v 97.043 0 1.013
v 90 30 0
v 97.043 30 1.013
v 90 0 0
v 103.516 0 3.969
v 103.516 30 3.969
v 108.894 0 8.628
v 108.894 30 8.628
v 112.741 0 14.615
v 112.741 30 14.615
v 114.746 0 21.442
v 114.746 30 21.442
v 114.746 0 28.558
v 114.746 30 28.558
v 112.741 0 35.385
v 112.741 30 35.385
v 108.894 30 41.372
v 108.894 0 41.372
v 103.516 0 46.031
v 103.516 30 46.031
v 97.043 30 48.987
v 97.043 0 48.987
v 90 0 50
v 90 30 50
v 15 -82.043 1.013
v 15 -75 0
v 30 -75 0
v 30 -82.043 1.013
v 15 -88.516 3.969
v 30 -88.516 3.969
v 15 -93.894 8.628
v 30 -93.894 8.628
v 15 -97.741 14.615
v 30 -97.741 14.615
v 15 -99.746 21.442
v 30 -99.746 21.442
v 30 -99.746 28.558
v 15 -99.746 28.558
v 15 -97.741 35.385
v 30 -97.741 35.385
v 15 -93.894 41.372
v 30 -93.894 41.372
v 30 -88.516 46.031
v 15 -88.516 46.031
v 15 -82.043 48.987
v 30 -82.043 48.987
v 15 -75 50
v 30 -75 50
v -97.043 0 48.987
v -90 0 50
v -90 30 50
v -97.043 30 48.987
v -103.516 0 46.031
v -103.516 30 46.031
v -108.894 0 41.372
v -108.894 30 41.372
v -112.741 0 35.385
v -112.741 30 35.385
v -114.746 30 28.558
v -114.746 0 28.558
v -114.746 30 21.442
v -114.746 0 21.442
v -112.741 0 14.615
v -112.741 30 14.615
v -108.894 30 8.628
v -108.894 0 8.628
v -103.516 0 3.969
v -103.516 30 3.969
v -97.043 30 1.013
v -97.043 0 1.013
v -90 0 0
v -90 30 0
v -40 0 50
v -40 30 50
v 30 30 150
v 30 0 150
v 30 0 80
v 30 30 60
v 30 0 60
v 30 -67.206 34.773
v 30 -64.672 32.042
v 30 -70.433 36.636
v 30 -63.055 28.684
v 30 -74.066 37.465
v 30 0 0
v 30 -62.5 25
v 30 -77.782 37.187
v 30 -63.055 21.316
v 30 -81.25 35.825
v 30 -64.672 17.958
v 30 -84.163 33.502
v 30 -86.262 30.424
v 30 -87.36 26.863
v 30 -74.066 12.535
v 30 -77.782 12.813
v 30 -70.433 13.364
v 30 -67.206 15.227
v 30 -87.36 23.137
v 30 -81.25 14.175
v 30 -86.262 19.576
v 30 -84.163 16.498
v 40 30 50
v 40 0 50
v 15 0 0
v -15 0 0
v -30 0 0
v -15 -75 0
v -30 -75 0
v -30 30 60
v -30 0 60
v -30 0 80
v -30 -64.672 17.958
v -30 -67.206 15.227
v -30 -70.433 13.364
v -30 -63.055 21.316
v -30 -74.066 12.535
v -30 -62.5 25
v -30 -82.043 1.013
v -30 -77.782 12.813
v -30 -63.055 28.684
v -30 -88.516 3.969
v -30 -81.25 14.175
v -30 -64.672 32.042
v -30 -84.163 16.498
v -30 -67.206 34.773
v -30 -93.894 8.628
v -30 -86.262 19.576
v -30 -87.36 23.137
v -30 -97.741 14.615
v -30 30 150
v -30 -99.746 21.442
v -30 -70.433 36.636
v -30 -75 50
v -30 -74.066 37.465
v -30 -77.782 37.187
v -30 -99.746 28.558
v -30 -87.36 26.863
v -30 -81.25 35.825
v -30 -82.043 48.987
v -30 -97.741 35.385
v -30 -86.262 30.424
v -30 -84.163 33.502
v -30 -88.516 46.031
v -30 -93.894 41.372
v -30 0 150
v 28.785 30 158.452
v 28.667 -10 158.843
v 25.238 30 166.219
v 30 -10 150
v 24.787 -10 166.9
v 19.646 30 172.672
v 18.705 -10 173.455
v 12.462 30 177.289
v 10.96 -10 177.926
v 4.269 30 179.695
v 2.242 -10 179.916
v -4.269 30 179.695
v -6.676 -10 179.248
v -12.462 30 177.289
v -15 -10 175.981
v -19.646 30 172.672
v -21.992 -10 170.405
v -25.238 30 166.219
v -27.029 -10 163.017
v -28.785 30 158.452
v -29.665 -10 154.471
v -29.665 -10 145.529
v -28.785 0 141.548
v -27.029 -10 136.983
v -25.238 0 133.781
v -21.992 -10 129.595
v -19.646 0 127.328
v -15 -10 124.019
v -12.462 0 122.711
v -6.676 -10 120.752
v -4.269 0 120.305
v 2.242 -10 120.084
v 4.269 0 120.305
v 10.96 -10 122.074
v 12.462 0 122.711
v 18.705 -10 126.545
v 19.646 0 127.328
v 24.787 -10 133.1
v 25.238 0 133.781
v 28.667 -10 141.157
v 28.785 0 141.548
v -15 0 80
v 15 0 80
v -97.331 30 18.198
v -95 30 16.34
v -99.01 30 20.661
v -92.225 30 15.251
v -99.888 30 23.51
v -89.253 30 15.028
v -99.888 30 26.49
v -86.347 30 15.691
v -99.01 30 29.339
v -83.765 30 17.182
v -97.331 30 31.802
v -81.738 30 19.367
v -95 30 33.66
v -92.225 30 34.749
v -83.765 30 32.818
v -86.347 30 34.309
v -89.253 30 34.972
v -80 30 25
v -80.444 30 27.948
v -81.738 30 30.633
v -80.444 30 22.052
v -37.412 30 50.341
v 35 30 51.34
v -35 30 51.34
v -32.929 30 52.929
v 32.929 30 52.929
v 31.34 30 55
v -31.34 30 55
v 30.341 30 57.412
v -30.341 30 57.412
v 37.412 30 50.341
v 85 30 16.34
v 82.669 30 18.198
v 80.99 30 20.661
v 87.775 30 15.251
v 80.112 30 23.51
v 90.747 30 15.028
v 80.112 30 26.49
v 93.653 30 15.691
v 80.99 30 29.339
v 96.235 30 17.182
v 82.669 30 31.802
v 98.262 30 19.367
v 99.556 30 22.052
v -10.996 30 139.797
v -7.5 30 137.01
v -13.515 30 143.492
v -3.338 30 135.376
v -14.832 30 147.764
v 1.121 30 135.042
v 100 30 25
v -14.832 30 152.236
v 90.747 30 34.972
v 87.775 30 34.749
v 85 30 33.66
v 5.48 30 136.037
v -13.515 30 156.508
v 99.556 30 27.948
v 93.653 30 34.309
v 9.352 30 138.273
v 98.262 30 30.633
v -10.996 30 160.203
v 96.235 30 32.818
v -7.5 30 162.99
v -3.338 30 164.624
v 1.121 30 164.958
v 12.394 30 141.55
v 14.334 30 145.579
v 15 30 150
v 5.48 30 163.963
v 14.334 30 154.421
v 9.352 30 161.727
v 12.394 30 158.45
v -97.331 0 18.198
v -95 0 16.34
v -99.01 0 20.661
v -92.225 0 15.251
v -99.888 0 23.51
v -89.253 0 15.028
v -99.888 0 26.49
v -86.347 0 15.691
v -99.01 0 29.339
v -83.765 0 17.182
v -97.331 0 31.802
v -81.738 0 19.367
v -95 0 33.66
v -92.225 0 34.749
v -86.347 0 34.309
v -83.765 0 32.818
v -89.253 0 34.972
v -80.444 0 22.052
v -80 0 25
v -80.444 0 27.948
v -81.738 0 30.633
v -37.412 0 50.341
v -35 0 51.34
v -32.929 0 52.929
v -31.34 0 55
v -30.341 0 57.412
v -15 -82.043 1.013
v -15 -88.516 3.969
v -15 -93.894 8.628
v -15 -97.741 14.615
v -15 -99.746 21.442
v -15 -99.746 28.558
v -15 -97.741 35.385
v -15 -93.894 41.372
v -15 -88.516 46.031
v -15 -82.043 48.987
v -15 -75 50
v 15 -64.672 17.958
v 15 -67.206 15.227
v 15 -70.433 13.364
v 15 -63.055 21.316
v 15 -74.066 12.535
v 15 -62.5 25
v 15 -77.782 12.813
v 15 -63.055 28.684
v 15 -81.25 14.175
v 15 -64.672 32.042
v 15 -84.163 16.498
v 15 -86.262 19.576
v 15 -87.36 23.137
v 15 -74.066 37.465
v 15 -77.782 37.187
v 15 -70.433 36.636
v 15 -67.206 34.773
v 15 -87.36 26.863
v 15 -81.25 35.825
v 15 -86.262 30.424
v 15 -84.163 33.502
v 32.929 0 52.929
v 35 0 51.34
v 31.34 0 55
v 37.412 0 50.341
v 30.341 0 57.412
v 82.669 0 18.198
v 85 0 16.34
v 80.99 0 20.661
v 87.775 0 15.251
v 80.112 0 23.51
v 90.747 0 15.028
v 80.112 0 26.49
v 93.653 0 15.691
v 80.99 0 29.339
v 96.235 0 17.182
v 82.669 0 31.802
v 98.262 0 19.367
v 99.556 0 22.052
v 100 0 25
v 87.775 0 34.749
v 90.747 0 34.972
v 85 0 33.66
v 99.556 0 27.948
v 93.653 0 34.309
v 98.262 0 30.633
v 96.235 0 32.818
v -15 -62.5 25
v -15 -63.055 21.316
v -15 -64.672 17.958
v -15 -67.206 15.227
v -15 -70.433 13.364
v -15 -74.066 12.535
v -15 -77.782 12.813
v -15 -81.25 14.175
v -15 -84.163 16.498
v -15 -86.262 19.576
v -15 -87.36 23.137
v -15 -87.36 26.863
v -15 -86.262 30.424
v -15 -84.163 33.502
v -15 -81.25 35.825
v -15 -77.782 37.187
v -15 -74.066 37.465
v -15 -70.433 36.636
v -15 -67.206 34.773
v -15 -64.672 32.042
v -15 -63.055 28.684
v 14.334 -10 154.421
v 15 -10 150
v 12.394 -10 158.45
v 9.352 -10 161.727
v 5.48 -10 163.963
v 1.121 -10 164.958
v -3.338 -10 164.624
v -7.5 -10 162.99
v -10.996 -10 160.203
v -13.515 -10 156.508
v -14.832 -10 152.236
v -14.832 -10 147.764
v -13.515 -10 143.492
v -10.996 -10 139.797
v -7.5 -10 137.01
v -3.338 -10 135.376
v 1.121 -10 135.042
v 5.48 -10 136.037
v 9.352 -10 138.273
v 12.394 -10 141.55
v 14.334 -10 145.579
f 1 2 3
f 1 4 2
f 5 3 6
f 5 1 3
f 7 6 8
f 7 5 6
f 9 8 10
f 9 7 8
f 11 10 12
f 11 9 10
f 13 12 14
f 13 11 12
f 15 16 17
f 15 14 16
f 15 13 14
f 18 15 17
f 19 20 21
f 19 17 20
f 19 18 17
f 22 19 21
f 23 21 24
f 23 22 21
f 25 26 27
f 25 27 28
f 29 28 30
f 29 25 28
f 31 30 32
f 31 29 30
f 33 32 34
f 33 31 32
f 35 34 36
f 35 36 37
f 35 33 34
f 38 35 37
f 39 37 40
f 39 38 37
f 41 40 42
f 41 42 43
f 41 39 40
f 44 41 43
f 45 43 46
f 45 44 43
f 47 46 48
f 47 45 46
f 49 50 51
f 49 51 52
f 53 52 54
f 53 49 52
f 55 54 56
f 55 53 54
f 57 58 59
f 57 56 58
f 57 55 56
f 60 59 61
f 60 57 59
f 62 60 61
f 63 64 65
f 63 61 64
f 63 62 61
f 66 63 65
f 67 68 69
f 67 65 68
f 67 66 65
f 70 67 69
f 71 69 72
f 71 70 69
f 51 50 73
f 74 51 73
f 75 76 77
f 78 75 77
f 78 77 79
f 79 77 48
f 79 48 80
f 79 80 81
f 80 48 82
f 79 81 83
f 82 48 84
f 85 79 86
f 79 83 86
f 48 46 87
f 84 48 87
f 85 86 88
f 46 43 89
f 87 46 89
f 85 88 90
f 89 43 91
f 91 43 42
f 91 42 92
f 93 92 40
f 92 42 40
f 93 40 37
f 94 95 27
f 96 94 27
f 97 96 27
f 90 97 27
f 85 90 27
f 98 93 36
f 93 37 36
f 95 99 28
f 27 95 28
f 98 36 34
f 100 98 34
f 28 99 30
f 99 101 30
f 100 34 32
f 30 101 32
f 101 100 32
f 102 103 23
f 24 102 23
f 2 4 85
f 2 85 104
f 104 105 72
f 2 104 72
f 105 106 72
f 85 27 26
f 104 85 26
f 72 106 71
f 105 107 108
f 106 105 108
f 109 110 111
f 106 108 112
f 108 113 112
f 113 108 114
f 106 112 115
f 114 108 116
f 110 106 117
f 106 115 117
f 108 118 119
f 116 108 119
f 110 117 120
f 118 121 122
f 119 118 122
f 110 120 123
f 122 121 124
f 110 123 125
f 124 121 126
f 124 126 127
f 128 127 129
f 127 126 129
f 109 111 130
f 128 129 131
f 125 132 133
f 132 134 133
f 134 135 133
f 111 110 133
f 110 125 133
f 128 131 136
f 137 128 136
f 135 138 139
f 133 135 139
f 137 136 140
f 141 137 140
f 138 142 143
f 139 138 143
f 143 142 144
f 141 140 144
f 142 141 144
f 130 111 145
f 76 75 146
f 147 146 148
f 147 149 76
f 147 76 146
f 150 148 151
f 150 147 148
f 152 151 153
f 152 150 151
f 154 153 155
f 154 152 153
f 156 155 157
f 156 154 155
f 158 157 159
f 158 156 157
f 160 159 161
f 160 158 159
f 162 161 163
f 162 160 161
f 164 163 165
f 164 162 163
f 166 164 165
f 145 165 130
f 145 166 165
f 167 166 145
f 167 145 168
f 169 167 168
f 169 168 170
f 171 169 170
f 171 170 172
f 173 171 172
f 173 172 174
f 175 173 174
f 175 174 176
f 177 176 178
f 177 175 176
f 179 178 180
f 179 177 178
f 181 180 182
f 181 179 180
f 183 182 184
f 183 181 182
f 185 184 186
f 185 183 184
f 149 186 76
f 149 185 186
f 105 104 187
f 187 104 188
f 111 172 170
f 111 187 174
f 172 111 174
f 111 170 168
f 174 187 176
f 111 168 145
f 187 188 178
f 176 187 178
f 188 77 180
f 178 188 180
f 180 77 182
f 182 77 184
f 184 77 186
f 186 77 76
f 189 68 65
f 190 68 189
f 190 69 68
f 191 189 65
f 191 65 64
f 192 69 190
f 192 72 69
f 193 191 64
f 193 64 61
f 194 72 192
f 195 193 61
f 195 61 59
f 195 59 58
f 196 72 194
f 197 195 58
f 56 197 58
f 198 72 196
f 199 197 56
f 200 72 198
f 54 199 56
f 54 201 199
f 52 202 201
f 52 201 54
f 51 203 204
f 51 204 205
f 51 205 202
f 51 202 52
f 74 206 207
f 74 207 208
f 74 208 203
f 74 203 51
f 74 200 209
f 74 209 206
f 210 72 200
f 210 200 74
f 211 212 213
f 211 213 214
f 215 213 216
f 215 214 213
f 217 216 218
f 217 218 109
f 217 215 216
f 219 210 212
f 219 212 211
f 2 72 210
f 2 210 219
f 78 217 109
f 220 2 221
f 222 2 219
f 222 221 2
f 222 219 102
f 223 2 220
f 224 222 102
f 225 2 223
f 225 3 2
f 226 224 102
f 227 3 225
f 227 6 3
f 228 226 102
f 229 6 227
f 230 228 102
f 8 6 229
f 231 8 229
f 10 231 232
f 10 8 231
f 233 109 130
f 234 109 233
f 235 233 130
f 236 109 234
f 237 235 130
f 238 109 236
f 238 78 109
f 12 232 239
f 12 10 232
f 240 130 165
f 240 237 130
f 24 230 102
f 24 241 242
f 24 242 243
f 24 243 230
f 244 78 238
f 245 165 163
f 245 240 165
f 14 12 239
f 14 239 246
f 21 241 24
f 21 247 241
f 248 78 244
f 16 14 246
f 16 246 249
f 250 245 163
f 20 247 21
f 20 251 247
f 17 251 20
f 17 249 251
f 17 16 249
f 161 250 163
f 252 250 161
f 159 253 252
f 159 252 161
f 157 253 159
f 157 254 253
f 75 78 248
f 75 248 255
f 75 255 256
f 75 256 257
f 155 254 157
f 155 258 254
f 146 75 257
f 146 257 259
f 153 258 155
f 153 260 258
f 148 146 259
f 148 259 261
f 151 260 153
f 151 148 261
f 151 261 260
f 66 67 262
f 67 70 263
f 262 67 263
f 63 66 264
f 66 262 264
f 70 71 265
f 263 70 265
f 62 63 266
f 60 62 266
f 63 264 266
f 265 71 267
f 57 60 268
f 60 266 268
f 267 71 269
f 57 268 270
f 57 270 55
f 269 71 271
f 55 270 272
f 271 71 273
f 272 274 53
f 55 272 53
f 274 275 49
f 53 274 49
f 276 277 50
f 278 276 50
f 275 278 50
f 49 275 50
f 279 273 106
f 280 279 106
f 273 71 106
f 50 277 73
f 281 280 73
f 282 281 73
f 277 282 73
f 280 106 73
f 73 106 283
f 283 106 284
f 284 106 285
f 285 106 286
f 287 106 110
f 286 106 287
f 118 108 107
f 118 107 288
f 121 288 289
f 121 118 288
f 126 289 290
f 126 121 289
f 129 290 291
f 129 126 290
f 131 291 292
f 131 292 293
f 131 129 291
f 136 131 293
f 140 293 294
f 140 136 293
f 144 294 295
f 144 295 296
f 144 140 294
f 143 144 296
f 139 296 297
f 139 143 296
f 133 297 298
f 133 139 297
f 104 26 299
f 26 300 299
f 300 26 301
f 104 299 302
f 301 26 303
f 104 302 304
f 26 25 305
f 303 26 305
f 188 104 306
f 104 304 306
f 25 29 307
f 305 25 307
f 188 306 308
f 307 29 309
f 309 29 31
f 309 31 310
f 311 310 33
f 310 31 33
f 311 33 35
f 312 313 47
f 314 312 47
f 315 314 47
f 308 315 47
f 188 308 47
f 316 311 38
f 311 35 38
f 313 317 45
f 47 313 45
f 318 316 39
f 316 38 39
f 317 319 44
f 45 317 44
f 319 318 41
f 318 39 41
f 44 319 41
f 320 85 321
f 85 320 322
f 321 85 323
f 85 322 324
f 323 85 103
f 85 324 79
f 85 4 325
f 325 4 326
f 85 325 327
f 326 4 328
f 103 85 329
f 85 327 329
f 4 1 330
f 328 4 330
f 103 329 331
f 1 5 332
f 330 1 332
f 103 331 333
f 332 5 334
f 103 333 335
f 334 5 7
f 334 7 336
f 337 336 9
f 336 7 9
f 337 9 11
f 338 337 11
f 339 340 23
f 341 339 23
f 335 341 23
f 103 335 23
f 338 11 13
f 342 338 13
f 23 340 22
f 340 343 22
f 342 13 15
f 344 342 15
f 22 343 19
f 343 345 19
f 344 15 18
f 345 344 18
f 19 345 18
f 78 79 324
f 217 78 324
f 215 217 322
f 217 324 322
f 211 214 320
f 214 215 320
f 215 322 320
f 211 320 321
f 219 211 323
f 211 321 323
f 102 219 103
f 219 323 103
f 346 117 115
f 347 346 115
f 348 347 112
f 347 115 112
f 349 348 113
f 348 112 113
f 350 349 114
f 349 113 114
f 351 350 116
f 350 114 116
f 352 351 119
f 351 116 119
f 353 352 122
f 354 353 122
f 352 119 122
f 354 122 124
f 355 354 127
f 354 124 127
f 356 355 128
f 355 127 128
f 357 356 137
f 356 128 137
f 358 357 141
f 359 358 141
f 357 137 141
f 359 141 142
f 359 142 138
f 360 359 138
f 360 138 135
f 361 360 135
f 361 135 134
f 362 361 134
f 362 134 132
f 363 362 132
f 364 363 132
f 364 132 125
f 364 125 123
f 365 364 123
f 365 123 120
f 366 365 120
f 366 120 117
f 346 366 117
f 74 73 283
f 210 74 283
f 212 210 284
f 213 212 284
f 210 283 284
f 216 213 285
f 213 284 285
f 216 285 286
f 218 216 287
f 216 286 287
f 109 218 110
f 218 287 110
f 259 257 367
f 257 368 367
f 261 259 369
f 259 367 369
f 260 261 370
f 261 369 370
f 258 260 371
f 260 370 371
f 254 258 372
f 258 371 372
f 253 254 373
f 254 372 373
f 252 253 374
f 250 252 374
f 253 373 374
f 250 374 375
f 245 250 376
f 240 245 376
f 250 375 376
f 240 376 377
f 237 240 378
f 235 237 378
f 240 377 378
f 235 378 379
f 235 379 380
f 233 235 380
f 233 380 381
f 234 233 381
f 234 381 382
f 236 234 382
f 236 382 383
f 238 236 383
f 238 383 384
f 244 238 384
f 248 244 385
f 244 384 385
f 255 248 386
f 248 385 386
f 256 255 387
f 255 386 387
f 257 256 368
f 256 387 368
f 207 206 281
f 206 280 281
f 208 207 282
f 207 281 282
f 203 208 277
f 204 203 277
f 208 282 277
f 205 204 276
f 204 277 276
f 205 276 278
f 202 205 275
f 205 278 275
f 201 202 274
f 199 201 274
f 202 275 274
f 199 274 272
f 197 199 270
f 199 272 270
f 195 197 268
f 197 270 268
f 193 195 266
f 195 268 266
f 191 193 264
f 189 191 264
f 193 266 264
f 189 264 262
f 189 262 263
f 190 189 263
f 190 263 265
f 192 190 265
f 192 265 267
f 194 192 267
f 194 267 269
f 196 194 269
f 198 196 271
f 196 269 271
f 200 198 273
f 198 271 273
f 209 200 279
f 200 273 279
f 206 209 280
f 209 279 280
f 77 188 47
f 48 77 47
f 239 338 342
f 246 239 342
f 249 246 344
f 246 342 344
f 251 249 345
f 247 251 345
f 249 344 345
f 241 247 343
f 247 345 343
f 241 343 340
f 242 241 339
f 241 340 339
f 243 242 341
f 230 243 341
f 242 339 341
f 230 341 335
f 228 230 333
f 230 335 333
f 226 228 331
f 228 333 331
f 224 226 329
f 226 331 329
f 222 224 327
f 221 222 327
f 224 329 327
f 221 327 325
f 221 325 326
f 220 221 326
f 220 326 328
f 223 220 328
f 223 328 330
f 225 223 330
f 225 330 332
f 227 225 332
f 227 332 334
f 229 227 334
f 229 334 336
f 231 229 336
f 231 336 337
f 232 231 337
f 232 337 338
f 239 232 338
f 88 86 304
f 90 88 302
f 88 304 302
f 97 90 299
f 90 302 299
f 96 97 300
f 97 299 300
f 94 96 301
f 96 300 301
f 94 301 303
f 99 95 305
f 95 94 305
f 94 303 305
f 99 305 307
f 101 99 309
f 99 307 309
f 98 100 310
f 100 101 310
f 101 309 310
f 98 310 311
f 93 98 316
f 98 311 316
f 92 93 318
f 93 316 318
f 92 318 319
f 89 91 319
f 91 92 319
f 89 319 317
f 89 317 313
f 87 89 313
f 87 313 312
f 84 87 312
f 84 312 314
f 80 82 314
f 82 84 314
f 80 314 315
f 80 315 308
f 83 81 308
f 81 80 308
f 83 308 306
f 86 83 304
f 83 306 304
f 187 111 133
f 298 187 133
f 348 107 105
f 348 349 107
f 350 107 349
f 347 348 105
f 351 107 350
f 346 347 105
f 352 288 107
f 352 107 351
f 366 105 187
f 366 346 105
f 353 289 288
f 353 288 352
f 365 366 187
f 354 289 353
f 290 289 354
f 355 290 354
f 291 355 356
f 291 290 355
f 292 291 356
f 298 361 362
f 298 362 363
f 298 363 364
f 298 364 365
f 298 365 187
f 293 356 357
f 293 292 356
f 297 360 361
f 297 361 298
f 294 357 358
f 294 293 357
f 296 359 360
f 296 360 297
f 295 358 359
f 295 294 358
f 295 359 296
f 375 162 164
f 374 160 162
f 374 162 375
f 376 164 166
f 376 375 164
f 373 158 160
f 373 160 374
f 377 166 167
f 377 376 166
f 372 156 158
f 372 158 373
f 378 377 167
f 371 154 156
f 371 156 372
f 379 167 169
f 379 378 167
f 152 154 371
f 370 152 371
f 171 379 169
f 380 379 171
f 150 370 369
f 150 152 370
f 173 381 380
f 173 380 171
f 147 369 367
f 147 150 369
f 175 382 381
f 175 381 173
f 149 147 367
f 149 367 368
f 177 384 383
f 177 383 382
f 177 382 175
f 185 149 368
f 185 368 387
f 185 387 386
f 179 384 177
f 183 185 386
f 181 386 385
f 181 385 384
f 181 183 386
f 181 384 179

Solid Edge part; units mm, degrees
sketch "Sketch1" plane through (0, 0, 0) normal (0, -1, 0) x (1, 0, 0)
  line L0 (30, 150) -> (30, 80)
  line L1 (30, 80) -> (30, 60)
  line L2 (40, 50) -> (90, 50)
  line L3 (90, 0) -> (0, 0)
  line L4 (0, 0) -> (-90, 0)
  line L5 (-90, 50) -> (-40, 50)
  line L6 (-30, 60) -> (-30, 80)
  line L7 (-30, 80) -> (-30, 150)
  arc A0 (40, 50) -> (30, 60) centre (40, 60) cw
  arc A1 (90, 50) -> (90, 0) centre (90, 25) cw
  arc A2 (-90, 0) -> (-90, 50) centre (-90, 25) cw
  arc A3 (-40, 50) -> (-30, 60) centre (-40, 60) ccw
  arc A4 (-30, 150) -> (30, 150) centre (0, 150) cw
extrude "Protrusion1" add sketch "Sketch1" against normal blind 30
sketch "Sketch2" plane through (0, 0, 0) normal (0, -1, 0) x (1, 0, 0)
  circle A0 centre (0, 150) radius 30
extrude "ExtrudedProtrusion_2" add sketch "Sketch2" along normal blind 10
sketch "Sketch3" plane through (0, 0, 0) normal (0, -1, 0) x (1, 0, 0)
  circle A0 centre (0, 150) radius 15
extrude "Cutout1" cut sketch "Sketch3" along normal mid plane 60
sketch "Sketch4" plane through (0, 0, 0) normal (0, -1, 0) x (1, 0, 0)
  circle A0 centre (90, 25) radius 10
extrude "Cutout2" cut sketch "Sketch4" along normal mid plane 60
sketch "Sketch5" plane through (0, 0, 0) normal (0, -1, 0) x (1, 0, 0)
  circle A0 centre (-90, 25) radius 10
extrude "ExtrudedCutout_3" cut sketch "Sketch5" along normal mid plane 60
sketch "Sketch6" plane through (0, 0, 0) normal (1, 0, 0) x (0, 1, 0)
  line L0 (0, 80) -> (-75, 50)
  line L1 (-75, 0) -> (0, 0)
  line L2 (0, 0) -> (0, 25)
  line L3 (0, 25) -> (0, 80)
  arc A0 (-75, 0) -> (-75, 50) centre (-75, 25) cw
extrude "ExtrudedProtrusion_4" add sketch "Sketch6" along normal mid plane 60
sketch "Sketch7" plane through (0, 0, 0) normal (1, 0, 0) x (0, 1, 0)
  circle A0 centre (-75, 25) radius 12.5
extrude "ExtrudedCutout_4" cut sketch "Sketch7" along normal mid plane 60
sketch "Sketch8" plane through (0, 0, 0) normal (1, 0, 0) x (0, 1, 0)
  line L0 (0, 80) -> (-75, 50)
  line L1 (0, 25) -> (0, 80)
  line L2 (0, 0) -> (0, 25)
  line L3 (-75, 0) -> (0, 0)
  arc A0 (-75, 0) -> (-75, 50) centre (-75, 25) cw
extrude "ExtrudedCutout_5" cut sketch "Sketch8" along normal mid plane 30
